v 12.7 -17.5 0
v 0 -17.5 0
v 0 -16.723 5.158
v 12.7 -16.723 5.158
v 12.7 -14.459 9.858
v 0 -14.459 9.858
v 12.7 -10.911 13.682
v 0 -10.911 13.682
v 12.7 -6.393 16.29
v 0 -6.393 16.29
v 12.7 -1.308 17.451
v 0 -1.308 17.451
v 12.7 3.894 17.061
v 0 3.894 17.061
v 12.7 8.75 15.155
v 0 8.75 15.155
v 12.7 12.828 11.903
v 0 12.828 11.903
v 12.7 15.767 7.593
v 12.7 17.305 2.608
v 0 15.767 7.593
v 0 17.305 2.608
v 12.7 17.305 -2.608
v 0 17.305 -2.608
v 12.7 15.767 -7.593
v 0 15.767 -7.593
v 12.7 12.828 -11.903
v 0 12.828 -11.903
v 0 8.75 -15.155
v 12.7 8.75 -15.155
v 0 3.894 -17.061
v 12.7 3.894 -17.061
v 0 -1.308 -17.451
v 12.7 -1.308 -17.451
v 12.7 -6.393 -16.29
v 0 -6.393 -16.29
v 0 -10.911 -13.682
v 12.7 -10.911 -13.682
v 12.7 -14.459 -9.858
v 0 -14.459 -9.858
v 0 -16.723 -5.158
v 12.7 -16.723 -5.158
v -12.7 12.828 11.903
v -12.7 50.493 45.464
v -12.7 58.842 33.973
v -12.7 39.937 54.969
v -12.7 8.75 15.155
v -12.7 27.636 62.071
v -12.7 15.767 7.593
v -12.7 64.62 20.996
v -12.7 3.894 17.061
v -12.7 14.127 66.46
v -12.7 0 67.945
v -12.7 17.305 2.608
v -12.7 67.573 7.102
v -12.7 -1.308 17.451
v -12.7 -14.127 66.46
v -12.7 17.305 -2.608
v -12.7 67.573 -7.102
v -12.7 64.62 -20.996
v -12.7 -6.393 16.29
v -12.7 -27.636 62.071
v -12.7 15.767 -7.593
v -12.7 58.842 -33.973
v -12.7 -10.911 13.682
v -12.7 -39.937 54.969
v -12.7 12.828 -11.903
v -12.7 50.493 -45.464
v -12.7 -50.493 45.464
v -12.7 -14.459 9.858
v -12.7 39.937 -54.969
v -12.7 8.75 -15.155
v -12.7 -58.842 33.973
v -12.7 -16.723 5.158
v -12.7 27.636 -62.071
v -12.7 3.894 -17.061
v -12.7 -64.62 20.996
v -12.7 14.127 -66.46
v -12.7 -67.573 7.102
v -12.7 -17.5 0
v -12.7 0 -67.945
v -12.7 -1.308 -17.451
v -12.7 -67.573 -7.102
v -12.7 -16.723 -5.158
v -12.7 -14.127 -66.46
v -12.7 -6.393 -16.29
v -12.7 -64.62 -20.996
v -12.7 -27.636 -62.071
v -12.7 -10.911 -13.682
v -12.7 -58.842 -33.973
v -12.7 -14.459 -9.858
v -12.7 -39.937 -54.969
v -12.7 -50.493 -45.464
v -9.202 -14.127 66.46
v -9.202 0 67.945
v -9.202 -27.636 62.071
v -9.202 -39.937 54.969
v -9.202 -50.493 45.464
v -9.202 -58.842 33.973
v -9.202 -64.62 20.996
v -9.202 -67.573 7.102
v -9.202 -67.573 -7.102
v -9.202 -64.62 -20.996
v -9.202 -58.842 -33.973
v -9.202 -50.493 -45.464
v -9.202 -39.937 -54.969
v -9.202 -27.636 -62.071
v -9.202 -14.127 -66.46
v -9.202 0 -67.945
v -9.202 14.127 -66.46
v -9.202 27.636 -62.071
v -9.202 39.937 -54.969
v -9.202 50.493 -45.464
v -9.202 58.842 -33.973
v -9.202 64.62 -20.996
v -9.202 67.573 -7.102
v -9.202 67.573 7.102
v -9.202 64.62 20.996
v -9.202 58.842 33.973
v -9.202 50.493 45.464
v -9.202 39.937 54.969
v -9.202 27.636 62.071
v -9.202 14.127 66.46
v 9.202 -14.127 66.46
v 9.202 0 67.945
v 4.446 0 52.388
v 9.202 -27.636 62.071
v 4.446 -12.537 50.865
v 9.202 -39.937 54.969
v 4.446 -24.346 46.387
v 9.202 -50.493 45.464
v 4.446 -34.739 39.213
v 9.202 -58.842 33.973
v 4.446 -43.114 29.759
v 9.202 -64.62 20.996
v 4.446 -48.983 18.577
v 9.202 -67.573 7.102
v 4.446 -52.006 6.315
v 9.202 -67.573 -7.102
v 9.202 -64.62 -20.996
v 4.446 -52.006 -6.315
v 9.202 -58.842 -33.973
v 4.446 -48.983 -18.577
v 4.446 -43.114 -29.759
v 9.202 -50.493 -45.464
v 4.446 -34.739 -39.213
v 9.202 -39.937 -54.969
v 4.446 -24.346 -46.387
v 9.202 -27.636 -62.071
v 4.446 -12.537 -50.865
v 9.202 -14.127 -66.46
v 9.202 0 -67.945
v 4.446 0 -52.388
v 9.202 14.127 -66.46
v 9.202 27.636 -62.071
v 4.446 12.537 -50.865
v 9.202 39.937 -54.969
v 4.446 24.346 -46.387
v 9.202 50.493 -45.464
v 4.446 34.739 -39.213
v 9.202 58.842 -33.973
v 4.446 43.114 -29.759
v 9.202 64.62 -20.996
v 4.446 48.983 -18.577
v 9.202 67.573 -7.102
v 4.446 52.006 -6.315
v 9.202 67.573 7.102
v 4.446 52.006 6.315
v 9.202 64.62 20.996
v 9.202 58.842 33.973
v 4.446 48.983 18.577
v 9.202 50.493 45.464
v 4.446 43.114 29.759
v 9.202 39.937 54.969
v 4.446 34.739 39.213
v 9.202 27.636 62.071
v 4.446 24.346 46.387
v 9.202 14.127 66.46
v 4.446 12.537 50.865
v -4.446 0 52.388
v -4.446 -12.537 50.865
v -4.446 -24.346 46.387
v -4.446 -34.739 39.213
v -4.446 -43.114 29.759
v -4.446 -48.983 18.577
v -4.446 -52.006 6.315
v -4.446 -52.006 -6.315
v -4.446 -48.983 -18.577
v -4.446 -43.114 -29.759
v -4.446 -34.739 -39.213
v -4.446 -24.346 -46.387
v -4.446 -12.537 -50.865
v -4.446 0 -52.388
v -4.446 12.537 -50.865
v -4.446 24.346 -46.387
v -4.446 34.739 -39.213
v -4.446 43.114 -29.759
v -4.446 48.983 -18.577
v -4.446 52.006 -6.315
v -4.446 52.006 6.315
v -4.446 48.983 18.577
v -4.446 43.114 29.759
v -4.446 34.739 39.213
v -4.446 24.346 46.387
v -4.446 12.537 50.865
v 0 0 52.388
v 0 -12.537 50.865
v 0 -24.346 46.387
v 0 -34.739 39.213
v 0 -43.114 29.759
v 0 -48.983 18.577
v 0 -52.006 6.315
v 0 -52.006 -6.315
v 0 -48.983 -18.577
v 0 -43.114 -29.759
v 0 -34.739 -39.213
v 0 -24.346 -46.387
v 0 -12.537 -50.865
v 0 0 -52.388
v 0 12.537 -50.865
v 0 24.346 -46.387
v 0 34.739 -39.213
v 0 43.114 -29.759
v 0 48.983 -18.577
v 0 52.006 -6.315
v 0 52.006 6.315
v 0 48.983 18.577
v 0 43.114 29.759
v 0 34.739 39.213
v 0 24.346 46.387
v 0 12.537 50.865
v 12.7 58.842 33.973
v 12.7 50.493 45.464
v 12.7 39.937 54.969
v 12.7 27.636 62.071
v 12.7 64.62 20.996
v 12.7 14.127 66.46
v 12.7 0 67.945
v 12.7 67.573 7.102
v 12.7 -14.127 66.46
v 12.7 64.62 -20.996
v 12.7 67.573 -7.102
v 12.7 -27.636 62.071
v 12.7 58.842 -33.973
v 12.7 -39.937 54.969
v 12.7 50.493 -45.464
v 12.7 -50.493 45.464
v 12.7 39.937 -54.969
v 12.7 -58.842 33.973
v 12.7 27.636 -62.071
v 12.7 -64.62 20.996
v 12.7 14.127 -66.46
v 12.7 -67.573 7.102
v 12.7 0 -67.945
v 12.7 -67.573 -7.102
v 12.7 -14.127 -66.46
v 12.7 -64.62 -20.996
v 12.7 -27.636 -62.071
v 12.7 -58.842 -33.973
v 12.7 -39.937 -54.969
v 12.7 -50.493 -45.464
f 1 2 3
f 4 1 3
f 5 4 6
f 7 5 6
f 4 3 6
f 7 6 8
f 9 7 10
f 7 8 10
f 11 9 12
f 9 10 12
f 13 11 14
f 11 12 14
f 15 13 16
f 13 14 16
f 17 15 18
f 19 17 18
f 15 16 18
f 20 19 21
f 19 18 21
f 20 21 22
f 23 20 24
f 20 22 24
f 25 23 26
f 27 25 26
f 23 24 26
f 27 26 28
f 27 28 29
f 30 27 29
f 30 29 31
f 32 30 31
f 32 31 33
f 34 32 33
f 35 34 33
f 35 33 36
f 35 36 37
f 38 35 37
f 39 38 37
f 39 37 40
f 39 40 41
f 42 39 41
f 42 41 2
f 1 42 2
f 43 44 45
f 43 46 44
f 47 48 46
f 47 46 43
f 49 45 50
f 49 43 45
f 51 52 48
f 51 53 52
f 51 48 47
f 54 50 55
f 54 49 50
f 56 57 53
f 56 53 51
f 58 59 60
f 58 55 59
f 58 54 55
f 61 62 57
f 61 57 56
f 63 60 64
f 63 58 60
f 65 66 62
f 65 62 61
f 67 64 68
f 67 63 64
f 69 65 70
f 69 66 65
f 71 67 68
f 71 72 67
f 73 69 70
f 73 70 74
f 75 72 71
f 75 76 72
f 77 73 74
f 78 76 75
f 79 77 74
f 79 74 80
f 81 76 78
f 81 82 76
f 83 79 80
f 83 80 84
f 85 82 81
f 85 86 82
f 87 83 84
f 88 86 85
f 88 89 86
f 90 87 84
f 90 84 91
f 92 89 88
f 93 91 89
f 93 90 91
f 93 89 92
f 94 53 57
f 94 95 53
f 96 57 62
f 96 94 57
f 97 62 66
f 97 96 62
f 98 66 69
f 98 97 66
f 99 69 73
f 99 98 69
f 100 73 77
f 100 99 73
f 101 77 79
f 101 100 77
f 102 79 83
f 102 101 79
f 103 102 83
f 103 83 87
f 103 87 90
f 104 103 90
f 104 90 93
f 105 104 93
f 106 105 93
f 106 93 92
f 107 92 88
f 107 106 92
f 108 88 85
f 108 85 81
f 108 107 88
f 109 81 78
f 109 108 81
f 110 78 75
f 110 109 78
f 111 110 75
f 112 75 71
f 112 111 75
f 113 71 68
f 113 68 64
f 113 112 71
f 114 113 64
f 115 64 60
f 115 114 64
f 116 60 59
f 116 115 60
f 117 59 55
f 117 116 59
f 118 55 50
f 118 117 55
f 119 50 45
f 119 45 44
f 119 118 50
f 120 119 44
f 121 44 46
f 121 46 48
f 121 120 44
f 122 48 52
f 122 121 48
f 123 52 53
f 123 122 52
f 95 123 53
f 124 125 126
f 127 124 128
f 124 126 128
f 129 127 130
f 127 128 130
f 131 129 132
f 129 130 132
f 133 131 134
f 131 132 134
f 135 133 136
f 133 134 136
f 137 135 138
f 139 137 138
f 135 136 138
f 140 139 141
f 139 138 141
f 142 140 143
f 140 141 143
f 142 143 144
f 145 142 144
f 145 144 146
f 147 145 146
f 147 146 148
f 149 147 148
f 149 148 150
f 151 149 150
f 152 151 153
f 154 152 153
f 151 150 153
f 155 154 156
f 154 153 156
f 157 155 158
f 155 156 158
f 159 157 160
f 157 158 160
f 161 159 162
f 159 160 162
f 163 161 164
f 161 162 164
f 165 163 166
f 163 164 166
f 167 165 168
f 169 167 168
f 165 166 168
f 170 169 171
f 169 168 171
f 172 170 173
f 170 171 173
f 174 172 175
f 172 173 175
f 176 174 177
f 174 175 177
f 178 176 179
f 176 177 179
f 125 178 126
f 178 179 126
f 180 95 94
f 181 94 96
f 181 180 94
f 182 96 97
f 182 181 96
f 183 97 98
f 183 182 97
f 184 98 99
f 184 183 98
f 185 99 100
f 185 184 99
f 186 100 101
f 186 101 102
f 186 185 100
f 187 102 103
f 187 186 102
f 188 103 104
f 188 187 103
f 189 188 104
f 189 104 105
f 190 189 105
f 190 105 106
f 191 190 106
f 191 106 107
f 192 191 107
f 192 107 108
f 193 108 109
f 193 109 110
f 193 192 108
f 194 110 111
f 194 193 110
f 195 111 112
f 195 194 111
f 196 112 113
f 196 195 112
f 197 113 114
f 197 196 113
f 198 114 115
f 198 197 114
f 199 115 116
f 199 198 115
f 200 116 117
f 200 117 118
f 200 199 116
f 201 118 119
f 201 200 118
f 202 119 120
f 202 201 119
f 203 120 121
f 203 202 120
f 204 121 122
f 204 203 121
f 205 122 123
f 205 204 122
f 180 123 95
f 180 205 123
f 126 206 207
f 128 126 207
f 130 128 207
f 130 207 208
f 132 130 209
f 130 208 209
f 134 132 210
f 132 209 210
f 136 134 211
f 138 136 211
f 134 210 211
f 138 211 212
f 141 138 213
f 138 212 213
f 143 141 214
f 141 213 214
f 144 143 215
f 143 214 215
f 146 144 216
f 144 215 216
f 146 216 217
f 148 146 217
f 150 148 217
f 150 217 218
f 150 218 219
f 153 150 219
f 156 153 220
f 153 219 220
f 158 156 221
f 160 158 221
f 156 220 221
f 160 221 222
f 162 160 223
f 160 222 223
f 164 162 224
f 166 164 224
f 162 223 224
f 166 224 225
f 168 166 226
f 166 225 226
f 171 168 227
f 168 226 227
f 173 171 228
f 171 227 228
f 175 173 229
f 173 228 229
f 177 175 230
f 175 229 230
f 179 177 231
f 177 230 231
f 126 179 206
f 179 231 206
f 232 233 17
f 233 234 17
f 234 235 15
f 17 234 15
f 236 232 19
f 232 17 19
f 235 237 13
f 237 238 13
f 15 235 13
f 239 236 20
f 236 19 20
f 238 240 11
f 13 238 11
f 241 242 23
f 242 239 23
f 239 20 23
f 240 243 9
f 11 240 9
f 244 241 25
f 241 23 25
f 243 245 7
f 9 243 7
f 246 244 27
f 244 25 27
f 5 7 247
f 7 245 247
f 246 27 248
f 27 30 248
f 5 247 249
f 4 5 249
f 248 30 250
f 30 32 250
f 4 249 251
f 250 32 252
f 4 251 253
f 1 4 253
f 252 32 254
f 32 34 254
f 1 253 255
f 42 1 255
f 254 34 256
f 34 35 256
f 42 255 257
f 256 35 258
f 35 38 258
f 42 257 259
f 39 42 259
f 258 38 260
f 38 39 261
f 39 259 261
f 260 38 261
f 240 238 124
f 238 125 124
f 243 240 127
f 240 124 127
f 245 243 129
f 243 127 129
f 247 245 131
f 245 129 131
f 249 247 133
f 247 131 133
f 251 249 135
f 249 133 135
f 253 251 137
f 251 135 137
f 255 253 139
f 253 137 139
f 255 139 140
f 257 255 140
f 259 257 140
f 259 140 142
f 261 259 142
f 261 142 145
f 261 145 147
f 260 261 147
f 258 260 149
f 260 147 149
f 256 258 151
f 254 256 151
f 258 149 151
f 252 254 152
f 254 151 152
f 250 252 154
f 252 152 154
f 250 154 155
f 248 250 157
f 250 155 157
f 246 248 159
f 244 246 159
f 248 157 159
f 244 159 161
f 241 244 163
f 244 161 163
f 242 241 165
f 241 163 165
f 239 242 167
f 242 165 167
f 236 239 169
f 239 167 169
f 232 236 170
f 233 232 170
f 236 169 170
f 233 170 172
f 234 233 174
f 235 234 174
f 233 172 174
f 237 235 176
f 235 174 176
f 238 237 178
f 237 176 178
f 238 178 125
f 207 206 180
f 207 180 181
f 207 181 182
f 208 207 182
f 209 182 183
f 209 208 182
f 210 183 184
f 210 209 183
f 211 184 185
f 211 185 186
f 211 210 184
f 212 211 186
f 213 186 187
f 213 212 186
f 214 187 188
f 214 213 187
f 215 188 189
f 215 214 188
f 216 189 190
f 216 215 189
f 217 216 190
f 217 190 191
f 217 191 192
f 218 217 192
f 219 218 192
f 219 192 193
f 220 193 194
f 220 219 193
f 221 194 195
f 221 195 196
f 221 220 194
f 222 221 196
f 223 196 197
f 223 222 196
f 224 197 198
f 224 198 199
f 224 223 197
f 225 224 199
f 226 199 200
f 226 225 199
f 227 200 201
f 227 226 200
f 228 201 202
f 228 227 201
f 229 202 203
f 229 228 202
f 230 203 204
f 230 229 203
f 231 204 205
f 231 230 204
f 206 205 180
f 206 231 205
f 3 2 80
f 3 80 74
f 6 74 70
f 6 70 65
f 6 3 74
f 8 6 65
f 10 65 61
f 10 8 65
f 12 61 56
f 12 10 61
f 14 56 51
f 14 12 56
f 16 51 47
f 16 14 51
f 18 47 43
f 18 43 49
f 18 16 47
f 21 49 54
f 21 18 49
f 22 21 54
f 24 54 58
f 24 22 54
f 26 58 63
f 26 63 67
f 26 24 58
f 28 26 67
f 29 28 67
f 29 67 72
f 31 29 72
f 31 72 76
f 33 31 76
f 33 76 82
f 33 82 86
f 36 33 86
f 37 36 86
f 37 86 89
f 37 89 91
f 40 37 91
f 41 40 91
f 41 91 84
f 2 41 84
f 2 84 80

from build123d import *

# Parameters (mm, degrees)
F2_R     = 17.5
F3_DEPTH = 25


with BuildPart() as f1:
    # F0 (on Front) → F1 (revolve)
    with BuildSketch(Plane.XZ):
        Polygon((0, 37.8452404466), (0, 0), (12.7, 0), (12.7, 52.3875), (4.4460149232, 52.3875), align=None)
        Polygon((0, 52.3875), (0, 37.8452404466), (4.4460149232, 52.3875), align=None)
        Polygon((9.20242, 67.945), (4.4460149232, 52.3875), (12.7, 52.3875), (12.7, 67.945), align=None)
    revolve(axis=Axis((21.4788783342, 0, 0), (1, 0, 0)))

    # F2 (on face) → F3 (cut)
    with BuildSketch(Plane(origin=(0, 0, 0), x_dir=(0, -1, 0), z_dir=(-1, 0, 0))):
        Circle(F2_R)
    extrude(amount=-F3_DEPTH, mode=Mode.SUBTRACT)

    # F4: F1 across plane


with BuildPart() as f1_1:
    add(f1.part)
    add(f1.part.mirror(Plane.YZ))


solid = f1_1.part
